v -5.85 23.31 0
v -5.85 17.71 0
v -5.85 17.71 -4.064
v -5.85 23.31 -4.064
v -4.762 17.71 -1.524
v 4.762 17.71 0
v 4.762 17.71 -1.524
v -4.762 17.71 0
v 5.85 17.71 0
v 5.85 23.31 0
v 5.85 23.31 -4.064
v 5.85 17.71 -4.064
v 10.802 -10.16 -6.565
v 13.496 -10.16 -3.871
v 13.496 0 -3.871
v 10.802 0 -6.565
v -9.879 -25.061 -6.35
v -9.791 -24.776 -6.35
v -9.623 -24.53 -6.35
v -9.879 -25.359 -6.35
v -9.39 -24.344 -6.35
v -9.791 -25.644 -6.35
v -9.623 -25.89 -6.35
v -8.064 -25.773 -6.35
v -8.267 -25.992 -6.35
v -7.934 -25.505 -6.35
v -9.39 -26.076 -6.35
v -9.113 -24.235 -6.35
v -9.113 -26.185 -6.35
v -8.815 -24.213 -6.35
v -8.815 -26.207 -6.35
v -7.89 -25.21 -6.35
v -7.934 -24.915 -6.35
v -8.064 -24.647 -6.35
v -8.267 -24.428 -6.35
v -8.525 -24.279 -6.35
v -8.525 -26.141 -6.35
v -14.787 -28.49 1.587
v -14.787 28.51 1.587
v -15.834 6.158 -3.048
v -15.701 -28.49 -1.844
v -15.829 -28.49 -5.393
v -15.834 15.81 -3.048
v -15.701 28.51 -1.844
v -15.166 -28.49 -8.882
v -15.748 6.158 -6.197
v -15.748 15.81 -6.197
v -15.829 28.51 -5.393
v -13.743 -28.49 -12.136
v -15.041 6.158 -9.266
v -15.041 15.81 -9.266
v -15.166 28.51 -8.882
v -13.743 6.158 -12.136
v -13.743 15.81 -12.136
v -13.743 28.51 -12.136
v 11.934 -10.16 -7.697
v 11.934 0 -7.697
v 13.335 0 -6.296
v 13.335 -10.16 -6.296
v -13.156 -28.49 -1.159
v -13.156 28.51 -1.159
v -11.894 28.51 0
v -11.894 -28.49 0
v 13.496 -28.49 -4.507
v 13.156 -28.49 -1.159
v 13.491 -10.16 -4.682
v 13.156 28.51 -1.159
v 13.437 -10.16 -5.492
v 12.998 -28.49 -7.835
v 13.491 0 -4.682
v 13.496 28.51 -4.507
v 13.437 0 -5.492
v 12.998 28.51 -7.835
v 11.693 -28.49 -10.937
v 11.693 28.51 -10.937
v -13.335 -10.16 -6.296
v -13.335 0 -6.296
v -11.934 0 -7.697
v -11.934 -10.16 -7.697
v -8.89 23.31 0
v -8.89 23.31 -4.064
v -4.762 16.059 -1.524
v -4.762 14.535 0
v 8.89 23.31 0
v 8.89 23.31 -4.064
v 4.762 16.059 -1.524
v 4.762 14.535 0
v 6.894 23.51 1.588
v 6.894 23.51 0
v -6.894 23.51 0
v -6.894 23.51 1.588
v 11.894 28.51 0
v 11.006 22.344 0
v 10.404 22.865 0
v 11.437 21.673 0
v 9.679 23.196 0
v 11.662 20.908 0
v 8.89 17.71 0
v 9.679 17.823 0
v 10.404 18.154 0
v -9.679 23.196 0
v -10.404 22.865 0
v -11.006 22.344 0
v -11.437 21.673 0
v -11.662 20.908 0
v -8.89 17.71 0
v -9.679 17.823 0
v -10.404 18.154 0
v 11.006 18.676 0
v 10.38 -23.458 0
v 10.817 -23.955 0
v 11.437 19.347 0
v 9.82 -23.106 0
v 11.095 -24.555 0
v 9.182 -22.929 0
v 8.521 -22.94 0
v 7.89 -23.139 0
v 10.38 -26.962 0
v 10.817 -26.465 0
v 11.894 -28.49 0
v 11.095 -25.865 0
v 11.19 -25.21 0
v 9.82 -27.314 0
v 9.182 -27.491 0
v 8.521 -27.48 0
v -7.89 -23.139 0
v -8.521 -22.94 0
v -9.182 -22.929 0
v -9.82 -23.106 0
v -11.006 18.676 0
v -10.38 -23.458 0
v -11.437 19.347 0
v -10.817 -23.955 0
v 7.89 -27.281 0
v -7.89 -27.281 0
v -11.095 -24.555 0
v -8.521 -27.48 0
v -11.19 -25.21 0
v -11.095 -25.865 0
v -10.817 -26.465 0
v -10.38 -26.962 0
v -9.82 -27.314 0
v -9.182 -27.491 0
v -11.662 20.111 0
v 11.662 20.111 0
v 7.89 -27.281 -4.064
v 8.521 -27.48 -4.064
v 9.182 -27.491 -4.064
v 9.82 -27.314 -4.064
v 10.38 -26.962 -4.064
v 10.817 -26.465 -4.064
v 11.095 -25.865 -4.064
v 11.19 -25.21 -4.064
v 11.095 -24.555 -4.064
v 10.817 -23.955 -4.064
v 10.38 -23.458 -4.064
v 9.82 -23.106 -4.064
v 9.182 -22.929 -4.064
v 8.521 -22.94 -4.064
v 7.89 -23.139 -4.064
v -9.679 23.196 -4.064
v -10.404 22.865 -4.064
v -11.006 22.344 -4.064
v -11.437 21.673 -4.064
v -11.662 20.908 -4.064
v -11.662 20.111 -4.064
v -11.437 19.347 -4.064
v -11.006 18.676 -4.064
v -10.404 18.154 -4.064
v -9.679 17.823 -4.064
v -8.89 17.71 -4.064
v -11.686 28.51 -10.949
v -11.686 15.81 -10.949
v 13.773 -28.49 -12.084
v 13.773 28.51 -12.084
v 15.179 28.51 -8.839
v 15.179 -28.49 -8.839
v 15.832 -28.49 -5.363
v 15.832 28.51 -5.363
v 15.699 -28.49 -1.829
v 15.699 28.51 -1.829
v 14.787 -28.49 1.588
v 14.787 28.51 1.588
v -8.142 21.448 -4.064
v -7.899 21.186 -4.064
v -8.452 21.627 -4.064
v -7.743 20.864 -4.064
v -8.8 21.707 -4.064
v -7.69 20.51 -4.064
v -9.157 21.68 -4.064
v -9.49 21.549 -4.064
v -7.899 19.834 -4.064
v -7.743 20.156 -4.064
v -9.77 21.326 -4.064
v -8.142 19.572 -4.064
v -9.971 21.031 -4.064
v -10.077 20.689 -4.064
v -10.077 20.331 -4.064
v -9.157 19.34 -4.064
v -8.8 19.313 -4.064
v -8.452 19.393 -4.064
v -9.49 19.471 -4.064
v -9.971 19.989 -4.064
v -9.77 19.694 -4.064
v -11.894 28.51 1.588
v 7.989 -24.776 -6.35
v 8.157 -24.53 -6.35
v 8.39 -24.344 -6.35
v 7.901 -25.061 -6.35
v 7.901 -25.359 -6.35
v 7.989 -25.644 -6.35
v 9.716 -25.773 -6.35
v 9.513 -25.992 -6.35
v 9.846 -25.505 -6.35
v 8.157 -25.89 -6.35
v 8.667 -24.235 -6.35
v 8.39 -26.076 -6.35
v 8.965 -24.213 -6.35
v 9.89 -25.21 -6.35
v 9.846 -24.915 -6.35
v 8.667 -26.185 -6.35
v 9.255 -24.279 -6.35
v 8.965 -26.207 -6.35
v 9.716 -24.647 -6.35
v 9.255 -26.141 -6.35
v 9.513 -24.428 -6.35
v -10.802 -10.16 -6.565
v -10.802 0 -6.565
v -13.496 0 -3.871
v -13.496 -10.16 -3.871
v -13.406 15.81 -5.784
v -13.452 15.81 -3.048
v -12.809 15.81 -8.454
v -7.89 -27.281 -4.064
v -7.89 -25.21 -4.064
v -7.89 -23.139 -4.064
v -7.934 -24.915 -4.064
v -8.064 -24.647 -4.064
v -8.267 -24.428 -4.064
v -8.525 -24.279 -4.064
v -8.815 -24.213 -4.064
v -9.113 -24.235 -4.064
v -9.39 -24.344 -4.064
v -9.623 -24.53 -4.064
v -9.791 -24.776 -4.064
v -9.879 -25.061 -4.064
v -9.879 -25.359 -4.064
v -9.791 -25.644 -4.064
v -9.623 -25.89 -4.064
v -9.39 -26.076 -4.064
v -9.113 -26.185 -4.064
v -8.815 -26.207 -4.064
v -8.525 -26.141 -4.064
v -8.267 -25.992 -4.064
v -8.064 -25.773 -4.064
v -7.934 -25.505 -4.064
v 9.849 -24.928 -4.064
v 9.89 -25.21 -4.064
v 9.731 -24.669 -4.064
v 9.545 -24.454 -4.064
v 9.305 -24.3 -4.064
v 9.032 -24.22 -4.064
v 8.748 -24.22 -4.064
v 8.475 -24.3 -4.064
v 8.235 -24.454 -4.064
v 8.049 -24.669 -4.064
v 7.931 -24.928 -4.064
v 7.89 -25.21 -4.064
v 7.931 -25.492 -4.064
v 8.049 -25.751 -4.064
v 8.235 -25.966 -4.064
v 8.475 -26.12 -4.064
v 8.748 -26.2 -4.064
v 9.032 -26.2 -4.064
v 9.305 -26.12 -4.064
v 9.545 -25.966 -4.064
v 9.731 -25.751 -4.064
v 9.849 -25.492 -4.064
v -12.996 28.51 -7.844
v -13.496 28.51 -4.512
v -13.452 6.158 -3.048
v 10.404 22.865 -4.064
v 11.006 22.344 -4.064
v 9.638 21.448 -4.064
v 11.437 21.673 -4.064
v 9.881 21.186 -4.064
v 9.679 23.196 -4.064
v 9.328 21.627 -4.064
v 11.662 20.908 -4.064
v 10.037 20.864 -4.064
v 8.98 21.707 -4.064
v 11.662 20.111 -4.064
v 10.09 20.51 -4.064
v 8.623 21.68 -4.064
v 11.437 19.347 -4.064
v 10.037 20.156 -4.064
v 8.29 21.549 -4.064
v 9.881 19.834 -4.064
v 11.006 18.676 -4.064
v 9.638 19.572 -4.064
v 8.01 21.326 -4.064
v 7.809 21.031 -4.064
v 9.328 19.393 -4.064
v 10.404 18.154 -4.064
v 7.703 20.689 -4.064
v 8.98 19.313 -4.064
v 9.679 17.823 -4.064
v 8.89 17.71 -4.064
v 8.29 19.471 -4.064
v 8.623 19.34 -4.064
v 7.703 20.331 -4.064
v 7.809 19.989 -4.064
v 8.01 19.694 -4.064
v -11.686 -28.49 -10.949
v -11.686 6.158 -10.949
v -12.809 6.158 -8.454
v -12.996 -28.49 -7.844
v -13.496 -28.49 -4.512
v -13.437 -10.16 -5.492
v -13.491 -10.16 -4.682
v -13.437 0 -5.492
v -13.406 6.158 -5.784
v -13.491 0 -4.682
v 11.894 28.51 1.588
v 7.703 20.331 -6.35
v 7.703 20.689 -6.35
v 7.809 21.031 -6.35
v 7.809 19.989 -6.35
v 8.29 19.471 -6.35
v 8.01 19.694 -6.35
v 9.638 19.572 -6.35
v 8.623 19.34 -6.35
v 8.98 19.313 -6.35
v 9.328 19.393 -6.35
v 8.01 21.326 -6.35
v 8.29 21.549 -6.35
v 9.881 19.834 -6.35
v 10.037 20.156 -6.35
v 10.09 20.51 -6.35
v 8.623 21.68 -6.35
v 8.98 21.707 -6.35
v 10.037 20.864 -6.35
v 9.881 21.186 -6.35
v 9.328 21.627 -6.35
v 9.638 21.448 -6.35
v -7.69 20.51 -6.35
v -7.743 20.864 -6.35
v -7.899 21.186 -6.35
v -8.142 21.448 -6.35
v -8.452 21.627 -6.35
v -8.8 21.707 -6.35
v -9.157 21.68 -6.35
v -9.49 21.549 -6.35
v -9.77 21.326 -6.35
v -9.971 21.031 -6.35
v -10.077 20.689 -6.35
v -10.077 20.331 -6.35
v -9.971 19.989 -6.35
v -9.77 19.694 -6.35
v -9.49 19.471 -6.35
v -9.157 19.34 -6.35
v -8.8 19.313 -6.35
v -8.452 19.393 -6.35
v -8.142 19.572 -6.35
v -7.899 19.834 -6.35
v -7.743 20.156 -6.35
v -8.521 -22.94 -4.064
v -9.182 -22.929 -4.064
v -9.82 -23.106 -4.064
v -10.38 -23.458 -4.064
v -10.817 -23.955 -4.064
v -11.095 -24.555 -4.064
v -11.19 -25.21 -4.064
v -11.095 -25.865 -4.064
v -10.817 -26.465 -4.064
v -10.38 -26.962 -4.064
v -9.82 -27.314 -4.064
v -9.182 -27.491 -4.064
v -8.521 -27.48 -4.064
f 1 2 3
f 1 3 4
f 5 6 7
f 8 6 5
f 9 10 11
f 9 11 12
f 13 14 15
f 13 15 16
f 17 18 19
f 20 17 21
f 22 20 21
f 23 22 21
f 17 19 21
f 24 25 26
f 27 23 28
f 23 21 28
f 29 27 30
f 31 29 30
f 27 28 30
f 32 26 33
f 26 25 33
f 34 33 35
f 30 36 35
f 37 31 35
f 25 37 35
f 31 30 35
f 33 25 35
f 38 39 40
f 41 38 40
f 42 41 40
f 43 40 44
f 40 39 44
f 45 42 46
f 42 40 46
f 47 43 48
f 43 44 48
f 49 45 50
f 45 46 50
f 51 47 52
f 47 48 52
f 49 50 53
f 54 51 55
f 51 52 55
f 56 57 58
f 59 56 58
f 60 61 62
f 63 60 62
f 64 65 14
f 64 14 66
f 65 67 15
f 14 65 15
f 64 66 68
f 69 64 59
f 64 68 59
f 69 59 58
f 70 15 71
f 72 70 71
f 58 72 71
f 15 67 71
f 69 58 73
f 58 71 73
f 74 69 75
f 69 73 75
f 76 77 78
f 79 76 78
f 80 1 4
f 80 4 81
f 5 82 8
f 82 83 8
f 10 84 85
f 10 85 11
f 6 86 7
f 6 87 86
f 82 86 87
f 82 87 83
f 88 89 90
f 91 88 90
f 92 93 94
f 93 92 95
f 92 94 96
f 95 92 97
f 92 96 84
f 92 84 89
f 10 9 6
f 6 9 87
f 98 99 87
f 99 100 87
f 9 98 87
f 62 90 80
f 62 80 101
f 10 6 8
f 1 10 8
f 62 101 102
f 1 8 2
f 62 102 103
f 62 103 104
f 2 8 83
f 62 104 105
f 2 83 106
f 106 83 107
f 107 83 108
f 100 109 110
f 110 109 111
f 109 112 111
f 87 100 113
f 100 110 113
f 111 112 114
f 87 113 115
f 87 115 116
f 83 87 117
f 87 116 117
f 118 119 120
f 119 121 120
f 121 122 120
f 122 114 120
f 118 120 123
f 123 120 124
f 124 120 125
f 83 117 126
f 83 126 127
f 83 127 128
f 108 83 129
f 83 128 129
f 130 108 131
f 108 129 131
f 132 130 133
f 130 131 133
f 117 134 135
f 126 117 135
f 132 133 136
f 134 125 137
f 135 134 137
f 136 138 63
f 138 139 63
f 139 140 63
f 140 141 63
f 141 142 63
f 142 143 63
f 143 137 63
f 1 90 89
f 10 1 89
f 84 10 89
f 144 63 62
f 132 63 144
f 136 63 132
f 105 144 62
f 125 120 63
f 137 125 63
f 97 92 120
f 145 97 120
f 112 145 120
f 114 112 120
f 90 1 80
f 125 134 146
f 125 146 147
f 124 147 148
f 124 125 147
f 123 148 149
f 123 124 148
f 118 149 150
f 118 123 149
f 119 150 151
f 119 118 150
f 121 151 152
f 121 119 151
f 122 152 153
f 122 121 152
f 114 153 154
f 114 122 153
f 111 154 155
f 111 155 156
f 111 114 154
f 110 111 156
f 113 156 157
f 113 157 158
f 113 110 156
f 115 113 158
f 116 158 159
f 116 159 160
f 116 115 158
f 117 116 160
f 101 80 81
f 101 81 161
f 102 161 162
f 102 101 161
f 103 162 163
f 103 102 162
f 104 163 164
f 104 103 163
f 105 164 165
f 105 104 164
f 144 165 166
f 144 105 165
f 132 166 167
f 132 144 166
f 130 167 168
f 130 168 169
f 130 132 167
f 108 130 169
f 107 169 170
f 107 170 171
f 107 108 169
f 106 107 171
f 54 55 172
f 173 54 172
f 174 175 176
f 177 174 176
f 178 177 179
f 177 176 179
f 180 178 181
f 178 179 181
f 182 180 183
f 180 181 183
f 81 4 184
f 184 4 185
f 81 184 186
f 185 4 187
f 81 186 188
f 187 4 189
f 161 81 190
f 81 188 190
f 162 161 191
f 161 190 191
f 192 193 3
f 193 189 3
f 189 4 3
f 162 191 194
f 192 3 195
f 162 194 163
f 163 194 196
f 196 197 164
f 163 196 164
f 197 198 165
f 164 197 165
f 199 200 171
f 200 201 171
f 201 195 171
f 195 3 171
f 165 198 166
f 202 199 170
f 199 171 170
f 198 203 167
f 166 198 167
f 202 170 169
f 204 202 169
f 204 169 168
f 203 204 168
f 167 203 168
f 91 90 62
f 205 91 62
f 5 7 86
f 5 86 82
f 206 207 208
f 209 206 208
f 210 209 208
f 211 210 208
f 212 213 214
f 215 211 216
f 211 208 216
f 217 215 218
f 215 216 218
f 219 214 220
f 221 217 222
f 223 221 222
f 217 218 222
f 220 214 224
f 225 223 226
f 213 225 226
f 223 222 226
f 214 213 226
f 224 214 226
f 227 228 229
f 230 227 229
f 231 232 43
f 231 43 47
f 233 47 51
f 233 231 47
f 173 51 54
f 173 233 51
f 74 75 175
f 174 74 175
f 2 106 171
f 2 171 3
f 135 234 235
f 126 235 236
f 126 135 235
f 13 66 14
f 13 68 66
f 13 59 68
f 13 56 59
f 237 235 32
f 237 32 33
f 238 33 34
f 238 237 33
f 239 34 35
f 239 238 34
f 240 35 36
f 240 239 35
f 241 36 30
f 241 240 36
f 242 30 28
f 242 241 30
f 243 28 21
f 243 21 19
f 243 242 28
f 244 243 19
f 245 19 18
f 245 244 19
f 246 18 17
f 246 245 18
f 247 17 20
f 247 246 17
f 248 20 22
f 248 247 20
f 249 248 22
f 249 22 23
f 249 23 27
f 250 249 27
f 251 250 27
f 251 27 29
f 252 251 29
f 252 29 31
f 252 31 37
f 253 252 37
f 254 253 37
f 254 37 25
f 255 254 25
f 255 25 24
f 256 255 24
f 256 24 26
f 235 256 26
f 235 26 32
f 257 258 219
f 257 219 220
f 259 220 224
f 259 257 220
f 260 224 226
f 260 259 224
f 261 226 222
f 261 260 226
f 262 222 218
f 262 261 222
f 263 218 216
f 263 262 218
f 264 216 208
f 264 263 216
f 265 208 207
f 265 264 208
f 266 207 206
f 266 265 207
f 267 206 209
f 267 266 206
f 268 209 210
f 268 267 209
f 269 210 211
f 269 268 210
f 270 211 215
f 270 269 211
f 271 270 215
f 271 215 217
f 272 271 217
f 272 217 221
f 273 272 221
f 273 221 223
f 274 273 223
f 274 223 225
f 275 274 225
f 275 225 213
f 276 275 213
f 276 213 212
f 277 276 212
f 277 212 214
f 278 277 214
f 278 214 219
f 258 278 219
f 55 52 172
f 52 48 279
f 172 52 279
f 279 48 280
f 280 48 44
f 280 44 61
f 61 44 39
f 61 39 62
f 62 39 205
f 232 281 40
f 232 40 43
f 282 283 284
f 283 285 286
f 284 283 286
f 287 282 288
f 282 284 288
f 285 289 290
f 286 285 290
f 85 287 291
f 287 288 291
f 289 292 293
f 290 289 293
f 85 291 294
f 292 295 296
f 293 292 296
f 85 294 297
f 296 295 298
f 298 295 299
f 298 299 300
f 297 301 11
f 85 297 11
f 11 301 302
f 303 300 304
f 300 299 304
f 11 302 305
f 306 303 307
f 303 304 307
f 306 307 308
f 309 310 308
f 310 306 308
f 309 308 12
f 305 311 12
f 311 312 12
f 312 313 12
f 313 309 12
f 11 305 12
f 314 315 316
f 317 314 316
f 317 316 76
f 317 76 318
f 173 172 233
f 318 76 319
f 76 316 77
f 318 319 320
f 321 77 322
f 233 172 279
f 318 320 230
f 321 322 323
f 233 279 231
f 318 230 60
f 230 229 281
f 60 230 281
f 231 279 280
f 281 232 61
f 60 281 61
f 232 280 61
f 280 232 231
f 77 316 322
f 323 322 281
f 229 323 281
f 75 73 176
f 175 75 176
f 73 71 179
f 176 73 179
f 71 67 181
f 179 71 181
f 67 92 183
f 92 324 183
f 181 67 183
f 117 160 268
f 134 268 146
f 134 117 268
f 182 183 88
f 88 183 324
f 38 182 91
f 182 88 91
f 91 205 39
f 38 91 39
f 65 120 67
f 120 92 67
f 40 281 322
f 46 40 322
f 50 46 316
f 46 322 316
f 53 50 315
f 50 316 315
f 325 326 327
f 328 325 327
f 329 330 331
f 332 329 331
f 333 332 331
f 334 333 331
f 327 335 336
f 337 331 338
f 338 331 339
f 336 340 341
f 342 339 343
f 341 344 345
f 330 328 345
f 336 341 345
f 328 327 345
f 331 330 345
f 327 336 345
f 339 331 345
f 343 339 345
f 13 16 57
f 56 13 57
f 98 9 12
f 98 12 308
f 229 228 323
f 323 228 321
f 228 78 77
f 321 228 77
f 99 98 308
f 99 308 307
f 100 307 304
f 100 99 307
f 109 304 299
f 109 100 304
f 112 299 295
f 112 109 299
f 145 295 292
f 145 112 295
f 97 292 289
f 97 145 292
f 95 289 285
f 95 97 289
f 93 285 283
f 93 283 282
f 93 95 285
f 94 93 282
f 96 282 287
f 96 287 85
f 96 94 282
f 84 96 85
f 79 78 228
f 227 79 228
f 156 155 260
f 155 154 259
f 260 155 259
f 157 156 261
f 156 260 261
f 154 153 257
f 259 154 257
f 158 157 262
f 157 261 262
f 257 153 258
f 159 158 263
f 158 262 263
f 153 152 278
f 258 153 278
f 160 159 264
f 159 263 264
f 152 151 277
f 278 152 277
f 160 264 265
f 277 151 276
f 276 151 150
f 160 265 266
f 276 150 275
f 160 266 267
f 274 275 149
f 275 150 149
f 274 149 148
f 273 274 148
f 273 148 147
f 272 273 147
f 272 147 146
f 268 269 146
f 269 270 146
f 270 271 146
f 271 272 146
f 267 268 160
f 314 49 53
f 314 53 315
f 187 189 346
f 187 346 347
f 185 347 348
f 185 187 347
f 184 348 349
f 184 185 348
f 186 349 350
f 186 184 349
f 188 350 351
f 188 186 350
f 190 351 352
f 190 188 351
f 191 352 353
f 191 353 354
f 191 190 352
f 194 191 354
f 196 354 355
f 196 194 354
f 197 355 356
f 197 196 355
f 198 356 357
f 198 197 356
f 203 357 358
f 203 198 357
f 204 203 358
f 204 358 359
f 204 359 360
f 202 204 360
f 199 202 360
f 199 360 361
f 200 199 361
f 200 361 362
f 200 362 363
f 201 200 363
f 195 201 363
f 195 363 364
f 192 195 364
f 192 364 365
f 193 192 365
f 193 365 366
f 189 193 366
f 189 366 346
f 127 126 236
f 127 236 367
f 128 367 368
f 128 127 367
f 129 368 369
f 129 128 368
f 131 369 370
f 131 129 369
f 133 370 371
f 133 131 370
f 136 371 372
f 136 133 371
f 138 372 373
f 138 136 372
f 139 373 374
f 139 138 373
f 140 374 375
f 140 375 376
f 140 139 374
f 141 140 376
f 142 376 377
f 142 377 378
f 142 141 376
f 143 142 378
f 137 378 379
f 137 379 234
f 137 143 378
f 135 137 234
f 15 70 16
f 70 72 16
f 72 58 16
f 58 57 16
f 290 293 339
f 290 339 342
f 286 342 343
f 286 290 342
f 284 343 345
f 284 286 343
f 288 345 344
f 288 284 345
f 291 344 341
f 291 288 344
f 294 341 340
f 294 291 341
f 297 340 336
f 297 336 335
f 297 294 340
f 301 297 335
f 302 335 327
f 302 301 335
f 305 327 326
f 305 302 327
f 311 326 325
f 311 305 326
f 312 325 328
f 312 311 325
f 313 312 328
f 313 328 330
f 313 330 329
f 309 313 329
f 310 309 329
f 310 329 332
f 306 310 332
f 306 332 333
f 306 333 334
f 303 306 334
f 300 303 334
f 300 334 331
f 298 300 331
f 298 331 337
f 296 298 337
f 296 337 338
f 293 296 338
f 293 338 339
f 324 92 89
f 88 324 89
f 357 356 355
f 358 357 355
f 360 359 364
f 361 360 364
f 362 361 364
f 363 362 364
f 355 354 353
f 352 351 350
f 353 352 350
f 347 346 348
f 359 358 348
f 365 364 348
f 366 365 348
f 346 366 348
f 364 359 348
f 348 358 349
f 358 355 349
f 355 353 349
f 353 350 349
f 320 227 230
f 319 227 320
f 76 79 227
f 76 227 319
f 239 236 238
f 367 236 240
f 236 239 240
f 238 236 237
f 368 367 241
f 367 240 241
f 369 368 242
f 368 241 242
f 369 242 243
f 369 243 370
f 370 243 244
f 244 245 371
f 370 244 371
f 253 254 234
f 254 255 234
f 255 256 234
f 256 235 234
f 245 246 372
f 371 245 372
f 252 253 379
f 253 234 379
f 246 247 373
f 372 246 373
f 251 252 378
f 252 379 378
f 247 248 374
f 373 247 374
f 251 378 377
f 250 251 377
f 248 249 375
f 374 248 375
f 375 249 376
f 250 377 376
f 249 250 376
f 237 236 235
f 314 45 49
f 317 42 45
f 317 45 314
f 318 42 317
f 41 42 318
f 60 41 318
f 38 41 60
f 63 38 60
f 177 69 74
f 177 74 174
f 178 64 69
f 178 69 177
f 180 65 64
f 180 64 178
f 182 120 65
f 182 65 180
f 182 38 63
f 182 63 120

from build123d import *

# Parameters (mm, degrees)
BOSS_EXTRUDE1_DEPTH = 1.524
SKETCH1_3_R         = 1.2
BOSS_EXTRUDE2_DEPTH = 4.064
SKETCH1_4_R         = 1
SKETCH1_4_R_2       = 1.2
BOSS_EXTRUDE3_DEPTH = 6.35
SKETCH3_W           = 9.525
SKETCH3_H           = 3.175
BOSS_EXTRUDE4_DEPTH = 1.524
CHAMFER1_SIZE       = 1.524
BOSS_EXTRUDE5_START = -57
BOSS_EXTRUDE5_DEPTH = 57
CUT_EXTRUDE1_DEPTH  = 35.815330499
SKETCH6_W           = 17.468754951
SKETCH6_H           = 9.652
CUT_EXTRUDE2_DEPTH  = 35.815330499
BOSS_EXTRUDE6_DEPTH = 10.16


with BuildPart() as part:
    # Sketch1 → Boss-Extrude1 (new body)
    with BuildSketch(Plane(origin=(0, 0, 0), x_dir=(-1, 0, 0), z_dir=(0, 0, 1))):
        Polygon((11.893796958, -28.509907181), (11.893796958, 28.490092819), (-11.893796958, 28.490092819), (-11.893796958, -28.509907181), (-6.893796958, -23.509907181), (6.893796958, -23.509907181), align=None)
    extrude(amount=BOSS_EXTRUDE1_DEPTH)

    # Sketch1<3> → Boss-Extrude2 (add)
    # profile 1 of 4: a face of its own
    with BuildSketch(Plane(origin=(0, 0, 0), x_dir=(-1, 0, 0), z_dir=(0, 0, 1))):
        with BuildLine():
            ThreePointArc((-8.89, -17.709907181), (-11.69, -20.509907181), (-8.89, -23.309907181))
            Line((-8.89, -23.309907181), (-5.85, -23.309907181))
            Line((-5.85, -23.309907181), (-5.85, -17.709907181))
            Line((-5.85, -17.709907181), (-8.89, -17.709907181))
        make_face()
        with Locations(Location((-8.89, -20.509907181, 0), (0, 0, 180))):
            Circle(SKETCH1_3_R, mode=Mode.SUBTRACT)
    # profile 2 of 4: a face of its own
    with BuildSketch(Plane(origin=(0, 0, 0), x_dir=(-1, 0, 0), z_dir=(0, 0, 1))):
        with BuildLine():
            ThreePointArc((8.89, -23.309907181), (11.69, -20.509907181), (8.89, -17.709907181))
            Line((8.89, -17.709907181), (5.85, -17.709907181))
            Line((5.85, -17.709907181), (5.85, -23.309907181))
            Line((5.85, -23.309907181), (8.89, -23.309907181))
        make_face()
    # profile 3 of 4: a face of its own
    with BuildSketch(Plane(origin=(0, 0, 0), x_dir=(-1, 0, 0), z_dir=(0, 0, 1))):
        with BuildLine():
            ThreePointArc((7.89, 23.138861301), (11.19, 25.210092819), (7.89, 27.281324337))
            Line((7.89, 27.281324337), (7.89, 23.138861301))
        make_face()
    # profile 4 of 4: a face of its own
    with BuildSketch(Plane(origin=(0, 0, 0), x_dir=(-1, 0, 0), z_dir=(0, 0, 1))):
        with BuildLine():
            ThreePointArc((-7.89, 27.281324337), (-11.19, 25.210092819), (-7.89, 23.138861301))
            Line((-7.89, 23.138861301), (-7.89, 27.281324337))
        make_face()
    extrude(amount=-BOSS_EXTRUDE2_DEPTH)

    # Sketch1<4> → Boss-Extrude3 (add)
    with BuildSketch(Plane(origin=(0, 0, 0), x_dir=(-1, 0, 0), z_dir=(0, 0, 1))):
        with Locations(Location((8.89, 25.210092819, 0), (0, 0, 180))):
            Circle(SKETCH1_4_R)
        with Locations(Location((-8.89, -20.509907181, 0), (0, 0, 180))):
            Circle(SKETCH1_4_R_2)
        with Locations(Location((-8.89, 25.210092819, 0), (0, 0, 180))):
            Circle(SKETCH1_4_R)
        with Locations(Location((8.89, -20.509907181, 0), (0, 0, 180))):
            Circle(SKETCH1_4_R_2)
    extrude(amount=-BOSS_EXTRUDE3_DEPTH)

    # Sketch3 → Boss-Extrude4 (add)
    with BuildSketch(Plane(origin=(0, 0, 0), x_dir=(-1, 0, 0), z_dir=(0, 0, -1))):
        with Locations((0, 16.122407181)):
            Rectangle(SKETCH3_W, SKETCH3_H)
    extrude(amount=BOSS_EXTRUDE4_DEPTH)

    # Chamfer1
    chamfer1_edges = [part.edges().sort_by_distance(p)[0] for p in [
        (0, 14.534907181, -1.524),
    ]]
    chamfer(chamfer1_edges, length=CHAMFER1_SIZE - 0.0001)  # a hair under: the kernel refuses the full size

    # Sketch4 → Boss-Extrude5 (add)
    with BuildSketch(Plane.XZ.offset(28.490092819).offset(BOSS_EXTRUDE5_START)):
        with BuildLine():
            ThreePointArc((13.155591368, -1.15943863), (13.351412917, -6.186799511), (11.692856631, -10.936735779))
            Line((11.692856631, -10.936735779), (13.772671764, -12.084238841))
            ThreePointArc((13.772671764, -12.084238841), (15.831522609, -5.363460963), (14.786599753, 1.5875))
            Line((14.786599753, 1.5875), (-14.786599753, 1.5875))
            ThreePointArc((-14.786599753, 1.5875), (-15.829296194, -5.393105445), (-13.743006885, -12.135765541))
            Line((-13.743006885, -12.135765541), (-11.685926468, -10.948731172))
            ThreePointArc((-11.685926468, -10.948731172), (-13.350386295, -6.193649708), (-13.155591368, -1.15943863))
            Line((-13.155591368, -1.15943863), (-11.893796958, 0))
            Line((-11.893796958, 0), (11.893796958, 0))
            Line((11.893796958, 0), (13.155591368, -1.15943863))
        make_face()
    extrude(amount=BOSS_EXTRUDE5_DEPTH)

    # Sketch5 → Cut-Extrude1 (cut, through all)
    with BuildSketch(Plane(origin=(0, 0, 0), x_dir=(-1, 0, 0), z_dir=(0, 0, -1))):
        Polygon((11.893796958, 28.509907181), (-11.893796958, 28.509907181), (-6.893796958, 23.509907181), (6.893796958, 23.509907181), align=None)
    extrude(amount=-CUT_EXTRUDE1_DEPTH, mode=Mode.SUBTRACT)

    # Sketch6 → Cut-Extrude2 (cut, through all)
    with BuildSketch(Plane(origin=(0, 0, 0), x_dir=(0, 0, -1), z_dir=(1, 0, 0))):
        with Locations((11.782377476, 10.983907181)):
            Rectangle(SKETCH6_W, SKETCH6_H)
    extrude(amount=-CUT_EXTRUDE2_DEPTH, mode=Mode.SUBTRACT)

    # Sketch7 → Boss-Extrude6 (add)
    with BuildSketch(Plane(origin=(0, 0, 0), x_dir=(1, 0, 0), z_dir=(0, 1, 0))):
        with BuildLine():
            Line((-13.334610111, 6.296055118), (-11.933690156, 7.696975073))
            Line((-11.933690156, 7.696975073), (-10.802177885, 6.565462802))
            Line((-10.802177885, 6.565462802), (-13.496254721, 3.871385965))
            ThreePointArc((-13.496254721, 3.871385965), (-13.394733651, 2.5067686), (-13.155591368, 1.15943863))
            Line((-13.155591368, 1.15943863), (-11.893796958, 0))
            Line((-11.893796958, 0), (11.893796958, 0))
            Line((11.893796958, 0), (13.155591368, 1.15943863))
            ThreePointArc((13.155591368, 1.15943863), (13.394733651, 2.5067686), (13.496254721, 3.871385965))
            Line((13.496254721, 3.871385965), (10.802177885, 6.565462802))
            Line((10.802177885, 6.565462802), (11.933690156, 7.696975073))
            Line((11.933690156, 7.696975073), (13.334610111, 6.296055118))
            ThreePointArc((13.334610111, 6.296055118), (12.727038231, 8.691857223), (11.692856631, 10.936735779))
            Line((11.692856631, 10.936735779), (13.772671764, 12.084238841))
            ThreePointArc((13.772671764, 12.084238841), (15.831522609, 5.363460963), (14.786599753, -1.5875))
            Line((14.786599753, -1.5875), (-14.786599753, -1.5875))
            ThreePointArc((-14.786599753, -1.5875), (-15.829296194, 5.393105445), (-13.743006885, 12.135765541))
            Line((-13.743006885, 12.135765541), (-11.685926468, 10.948731172))
            ThreePointArc((-11.685926468, 10.948731172), (-12.724726374, 8.698386731), (-13.334610111, 6.296055118))
        make_face()
    extrude(amount=-BOSS_EXTRUDE6_DEPTH)


solid = part.part
